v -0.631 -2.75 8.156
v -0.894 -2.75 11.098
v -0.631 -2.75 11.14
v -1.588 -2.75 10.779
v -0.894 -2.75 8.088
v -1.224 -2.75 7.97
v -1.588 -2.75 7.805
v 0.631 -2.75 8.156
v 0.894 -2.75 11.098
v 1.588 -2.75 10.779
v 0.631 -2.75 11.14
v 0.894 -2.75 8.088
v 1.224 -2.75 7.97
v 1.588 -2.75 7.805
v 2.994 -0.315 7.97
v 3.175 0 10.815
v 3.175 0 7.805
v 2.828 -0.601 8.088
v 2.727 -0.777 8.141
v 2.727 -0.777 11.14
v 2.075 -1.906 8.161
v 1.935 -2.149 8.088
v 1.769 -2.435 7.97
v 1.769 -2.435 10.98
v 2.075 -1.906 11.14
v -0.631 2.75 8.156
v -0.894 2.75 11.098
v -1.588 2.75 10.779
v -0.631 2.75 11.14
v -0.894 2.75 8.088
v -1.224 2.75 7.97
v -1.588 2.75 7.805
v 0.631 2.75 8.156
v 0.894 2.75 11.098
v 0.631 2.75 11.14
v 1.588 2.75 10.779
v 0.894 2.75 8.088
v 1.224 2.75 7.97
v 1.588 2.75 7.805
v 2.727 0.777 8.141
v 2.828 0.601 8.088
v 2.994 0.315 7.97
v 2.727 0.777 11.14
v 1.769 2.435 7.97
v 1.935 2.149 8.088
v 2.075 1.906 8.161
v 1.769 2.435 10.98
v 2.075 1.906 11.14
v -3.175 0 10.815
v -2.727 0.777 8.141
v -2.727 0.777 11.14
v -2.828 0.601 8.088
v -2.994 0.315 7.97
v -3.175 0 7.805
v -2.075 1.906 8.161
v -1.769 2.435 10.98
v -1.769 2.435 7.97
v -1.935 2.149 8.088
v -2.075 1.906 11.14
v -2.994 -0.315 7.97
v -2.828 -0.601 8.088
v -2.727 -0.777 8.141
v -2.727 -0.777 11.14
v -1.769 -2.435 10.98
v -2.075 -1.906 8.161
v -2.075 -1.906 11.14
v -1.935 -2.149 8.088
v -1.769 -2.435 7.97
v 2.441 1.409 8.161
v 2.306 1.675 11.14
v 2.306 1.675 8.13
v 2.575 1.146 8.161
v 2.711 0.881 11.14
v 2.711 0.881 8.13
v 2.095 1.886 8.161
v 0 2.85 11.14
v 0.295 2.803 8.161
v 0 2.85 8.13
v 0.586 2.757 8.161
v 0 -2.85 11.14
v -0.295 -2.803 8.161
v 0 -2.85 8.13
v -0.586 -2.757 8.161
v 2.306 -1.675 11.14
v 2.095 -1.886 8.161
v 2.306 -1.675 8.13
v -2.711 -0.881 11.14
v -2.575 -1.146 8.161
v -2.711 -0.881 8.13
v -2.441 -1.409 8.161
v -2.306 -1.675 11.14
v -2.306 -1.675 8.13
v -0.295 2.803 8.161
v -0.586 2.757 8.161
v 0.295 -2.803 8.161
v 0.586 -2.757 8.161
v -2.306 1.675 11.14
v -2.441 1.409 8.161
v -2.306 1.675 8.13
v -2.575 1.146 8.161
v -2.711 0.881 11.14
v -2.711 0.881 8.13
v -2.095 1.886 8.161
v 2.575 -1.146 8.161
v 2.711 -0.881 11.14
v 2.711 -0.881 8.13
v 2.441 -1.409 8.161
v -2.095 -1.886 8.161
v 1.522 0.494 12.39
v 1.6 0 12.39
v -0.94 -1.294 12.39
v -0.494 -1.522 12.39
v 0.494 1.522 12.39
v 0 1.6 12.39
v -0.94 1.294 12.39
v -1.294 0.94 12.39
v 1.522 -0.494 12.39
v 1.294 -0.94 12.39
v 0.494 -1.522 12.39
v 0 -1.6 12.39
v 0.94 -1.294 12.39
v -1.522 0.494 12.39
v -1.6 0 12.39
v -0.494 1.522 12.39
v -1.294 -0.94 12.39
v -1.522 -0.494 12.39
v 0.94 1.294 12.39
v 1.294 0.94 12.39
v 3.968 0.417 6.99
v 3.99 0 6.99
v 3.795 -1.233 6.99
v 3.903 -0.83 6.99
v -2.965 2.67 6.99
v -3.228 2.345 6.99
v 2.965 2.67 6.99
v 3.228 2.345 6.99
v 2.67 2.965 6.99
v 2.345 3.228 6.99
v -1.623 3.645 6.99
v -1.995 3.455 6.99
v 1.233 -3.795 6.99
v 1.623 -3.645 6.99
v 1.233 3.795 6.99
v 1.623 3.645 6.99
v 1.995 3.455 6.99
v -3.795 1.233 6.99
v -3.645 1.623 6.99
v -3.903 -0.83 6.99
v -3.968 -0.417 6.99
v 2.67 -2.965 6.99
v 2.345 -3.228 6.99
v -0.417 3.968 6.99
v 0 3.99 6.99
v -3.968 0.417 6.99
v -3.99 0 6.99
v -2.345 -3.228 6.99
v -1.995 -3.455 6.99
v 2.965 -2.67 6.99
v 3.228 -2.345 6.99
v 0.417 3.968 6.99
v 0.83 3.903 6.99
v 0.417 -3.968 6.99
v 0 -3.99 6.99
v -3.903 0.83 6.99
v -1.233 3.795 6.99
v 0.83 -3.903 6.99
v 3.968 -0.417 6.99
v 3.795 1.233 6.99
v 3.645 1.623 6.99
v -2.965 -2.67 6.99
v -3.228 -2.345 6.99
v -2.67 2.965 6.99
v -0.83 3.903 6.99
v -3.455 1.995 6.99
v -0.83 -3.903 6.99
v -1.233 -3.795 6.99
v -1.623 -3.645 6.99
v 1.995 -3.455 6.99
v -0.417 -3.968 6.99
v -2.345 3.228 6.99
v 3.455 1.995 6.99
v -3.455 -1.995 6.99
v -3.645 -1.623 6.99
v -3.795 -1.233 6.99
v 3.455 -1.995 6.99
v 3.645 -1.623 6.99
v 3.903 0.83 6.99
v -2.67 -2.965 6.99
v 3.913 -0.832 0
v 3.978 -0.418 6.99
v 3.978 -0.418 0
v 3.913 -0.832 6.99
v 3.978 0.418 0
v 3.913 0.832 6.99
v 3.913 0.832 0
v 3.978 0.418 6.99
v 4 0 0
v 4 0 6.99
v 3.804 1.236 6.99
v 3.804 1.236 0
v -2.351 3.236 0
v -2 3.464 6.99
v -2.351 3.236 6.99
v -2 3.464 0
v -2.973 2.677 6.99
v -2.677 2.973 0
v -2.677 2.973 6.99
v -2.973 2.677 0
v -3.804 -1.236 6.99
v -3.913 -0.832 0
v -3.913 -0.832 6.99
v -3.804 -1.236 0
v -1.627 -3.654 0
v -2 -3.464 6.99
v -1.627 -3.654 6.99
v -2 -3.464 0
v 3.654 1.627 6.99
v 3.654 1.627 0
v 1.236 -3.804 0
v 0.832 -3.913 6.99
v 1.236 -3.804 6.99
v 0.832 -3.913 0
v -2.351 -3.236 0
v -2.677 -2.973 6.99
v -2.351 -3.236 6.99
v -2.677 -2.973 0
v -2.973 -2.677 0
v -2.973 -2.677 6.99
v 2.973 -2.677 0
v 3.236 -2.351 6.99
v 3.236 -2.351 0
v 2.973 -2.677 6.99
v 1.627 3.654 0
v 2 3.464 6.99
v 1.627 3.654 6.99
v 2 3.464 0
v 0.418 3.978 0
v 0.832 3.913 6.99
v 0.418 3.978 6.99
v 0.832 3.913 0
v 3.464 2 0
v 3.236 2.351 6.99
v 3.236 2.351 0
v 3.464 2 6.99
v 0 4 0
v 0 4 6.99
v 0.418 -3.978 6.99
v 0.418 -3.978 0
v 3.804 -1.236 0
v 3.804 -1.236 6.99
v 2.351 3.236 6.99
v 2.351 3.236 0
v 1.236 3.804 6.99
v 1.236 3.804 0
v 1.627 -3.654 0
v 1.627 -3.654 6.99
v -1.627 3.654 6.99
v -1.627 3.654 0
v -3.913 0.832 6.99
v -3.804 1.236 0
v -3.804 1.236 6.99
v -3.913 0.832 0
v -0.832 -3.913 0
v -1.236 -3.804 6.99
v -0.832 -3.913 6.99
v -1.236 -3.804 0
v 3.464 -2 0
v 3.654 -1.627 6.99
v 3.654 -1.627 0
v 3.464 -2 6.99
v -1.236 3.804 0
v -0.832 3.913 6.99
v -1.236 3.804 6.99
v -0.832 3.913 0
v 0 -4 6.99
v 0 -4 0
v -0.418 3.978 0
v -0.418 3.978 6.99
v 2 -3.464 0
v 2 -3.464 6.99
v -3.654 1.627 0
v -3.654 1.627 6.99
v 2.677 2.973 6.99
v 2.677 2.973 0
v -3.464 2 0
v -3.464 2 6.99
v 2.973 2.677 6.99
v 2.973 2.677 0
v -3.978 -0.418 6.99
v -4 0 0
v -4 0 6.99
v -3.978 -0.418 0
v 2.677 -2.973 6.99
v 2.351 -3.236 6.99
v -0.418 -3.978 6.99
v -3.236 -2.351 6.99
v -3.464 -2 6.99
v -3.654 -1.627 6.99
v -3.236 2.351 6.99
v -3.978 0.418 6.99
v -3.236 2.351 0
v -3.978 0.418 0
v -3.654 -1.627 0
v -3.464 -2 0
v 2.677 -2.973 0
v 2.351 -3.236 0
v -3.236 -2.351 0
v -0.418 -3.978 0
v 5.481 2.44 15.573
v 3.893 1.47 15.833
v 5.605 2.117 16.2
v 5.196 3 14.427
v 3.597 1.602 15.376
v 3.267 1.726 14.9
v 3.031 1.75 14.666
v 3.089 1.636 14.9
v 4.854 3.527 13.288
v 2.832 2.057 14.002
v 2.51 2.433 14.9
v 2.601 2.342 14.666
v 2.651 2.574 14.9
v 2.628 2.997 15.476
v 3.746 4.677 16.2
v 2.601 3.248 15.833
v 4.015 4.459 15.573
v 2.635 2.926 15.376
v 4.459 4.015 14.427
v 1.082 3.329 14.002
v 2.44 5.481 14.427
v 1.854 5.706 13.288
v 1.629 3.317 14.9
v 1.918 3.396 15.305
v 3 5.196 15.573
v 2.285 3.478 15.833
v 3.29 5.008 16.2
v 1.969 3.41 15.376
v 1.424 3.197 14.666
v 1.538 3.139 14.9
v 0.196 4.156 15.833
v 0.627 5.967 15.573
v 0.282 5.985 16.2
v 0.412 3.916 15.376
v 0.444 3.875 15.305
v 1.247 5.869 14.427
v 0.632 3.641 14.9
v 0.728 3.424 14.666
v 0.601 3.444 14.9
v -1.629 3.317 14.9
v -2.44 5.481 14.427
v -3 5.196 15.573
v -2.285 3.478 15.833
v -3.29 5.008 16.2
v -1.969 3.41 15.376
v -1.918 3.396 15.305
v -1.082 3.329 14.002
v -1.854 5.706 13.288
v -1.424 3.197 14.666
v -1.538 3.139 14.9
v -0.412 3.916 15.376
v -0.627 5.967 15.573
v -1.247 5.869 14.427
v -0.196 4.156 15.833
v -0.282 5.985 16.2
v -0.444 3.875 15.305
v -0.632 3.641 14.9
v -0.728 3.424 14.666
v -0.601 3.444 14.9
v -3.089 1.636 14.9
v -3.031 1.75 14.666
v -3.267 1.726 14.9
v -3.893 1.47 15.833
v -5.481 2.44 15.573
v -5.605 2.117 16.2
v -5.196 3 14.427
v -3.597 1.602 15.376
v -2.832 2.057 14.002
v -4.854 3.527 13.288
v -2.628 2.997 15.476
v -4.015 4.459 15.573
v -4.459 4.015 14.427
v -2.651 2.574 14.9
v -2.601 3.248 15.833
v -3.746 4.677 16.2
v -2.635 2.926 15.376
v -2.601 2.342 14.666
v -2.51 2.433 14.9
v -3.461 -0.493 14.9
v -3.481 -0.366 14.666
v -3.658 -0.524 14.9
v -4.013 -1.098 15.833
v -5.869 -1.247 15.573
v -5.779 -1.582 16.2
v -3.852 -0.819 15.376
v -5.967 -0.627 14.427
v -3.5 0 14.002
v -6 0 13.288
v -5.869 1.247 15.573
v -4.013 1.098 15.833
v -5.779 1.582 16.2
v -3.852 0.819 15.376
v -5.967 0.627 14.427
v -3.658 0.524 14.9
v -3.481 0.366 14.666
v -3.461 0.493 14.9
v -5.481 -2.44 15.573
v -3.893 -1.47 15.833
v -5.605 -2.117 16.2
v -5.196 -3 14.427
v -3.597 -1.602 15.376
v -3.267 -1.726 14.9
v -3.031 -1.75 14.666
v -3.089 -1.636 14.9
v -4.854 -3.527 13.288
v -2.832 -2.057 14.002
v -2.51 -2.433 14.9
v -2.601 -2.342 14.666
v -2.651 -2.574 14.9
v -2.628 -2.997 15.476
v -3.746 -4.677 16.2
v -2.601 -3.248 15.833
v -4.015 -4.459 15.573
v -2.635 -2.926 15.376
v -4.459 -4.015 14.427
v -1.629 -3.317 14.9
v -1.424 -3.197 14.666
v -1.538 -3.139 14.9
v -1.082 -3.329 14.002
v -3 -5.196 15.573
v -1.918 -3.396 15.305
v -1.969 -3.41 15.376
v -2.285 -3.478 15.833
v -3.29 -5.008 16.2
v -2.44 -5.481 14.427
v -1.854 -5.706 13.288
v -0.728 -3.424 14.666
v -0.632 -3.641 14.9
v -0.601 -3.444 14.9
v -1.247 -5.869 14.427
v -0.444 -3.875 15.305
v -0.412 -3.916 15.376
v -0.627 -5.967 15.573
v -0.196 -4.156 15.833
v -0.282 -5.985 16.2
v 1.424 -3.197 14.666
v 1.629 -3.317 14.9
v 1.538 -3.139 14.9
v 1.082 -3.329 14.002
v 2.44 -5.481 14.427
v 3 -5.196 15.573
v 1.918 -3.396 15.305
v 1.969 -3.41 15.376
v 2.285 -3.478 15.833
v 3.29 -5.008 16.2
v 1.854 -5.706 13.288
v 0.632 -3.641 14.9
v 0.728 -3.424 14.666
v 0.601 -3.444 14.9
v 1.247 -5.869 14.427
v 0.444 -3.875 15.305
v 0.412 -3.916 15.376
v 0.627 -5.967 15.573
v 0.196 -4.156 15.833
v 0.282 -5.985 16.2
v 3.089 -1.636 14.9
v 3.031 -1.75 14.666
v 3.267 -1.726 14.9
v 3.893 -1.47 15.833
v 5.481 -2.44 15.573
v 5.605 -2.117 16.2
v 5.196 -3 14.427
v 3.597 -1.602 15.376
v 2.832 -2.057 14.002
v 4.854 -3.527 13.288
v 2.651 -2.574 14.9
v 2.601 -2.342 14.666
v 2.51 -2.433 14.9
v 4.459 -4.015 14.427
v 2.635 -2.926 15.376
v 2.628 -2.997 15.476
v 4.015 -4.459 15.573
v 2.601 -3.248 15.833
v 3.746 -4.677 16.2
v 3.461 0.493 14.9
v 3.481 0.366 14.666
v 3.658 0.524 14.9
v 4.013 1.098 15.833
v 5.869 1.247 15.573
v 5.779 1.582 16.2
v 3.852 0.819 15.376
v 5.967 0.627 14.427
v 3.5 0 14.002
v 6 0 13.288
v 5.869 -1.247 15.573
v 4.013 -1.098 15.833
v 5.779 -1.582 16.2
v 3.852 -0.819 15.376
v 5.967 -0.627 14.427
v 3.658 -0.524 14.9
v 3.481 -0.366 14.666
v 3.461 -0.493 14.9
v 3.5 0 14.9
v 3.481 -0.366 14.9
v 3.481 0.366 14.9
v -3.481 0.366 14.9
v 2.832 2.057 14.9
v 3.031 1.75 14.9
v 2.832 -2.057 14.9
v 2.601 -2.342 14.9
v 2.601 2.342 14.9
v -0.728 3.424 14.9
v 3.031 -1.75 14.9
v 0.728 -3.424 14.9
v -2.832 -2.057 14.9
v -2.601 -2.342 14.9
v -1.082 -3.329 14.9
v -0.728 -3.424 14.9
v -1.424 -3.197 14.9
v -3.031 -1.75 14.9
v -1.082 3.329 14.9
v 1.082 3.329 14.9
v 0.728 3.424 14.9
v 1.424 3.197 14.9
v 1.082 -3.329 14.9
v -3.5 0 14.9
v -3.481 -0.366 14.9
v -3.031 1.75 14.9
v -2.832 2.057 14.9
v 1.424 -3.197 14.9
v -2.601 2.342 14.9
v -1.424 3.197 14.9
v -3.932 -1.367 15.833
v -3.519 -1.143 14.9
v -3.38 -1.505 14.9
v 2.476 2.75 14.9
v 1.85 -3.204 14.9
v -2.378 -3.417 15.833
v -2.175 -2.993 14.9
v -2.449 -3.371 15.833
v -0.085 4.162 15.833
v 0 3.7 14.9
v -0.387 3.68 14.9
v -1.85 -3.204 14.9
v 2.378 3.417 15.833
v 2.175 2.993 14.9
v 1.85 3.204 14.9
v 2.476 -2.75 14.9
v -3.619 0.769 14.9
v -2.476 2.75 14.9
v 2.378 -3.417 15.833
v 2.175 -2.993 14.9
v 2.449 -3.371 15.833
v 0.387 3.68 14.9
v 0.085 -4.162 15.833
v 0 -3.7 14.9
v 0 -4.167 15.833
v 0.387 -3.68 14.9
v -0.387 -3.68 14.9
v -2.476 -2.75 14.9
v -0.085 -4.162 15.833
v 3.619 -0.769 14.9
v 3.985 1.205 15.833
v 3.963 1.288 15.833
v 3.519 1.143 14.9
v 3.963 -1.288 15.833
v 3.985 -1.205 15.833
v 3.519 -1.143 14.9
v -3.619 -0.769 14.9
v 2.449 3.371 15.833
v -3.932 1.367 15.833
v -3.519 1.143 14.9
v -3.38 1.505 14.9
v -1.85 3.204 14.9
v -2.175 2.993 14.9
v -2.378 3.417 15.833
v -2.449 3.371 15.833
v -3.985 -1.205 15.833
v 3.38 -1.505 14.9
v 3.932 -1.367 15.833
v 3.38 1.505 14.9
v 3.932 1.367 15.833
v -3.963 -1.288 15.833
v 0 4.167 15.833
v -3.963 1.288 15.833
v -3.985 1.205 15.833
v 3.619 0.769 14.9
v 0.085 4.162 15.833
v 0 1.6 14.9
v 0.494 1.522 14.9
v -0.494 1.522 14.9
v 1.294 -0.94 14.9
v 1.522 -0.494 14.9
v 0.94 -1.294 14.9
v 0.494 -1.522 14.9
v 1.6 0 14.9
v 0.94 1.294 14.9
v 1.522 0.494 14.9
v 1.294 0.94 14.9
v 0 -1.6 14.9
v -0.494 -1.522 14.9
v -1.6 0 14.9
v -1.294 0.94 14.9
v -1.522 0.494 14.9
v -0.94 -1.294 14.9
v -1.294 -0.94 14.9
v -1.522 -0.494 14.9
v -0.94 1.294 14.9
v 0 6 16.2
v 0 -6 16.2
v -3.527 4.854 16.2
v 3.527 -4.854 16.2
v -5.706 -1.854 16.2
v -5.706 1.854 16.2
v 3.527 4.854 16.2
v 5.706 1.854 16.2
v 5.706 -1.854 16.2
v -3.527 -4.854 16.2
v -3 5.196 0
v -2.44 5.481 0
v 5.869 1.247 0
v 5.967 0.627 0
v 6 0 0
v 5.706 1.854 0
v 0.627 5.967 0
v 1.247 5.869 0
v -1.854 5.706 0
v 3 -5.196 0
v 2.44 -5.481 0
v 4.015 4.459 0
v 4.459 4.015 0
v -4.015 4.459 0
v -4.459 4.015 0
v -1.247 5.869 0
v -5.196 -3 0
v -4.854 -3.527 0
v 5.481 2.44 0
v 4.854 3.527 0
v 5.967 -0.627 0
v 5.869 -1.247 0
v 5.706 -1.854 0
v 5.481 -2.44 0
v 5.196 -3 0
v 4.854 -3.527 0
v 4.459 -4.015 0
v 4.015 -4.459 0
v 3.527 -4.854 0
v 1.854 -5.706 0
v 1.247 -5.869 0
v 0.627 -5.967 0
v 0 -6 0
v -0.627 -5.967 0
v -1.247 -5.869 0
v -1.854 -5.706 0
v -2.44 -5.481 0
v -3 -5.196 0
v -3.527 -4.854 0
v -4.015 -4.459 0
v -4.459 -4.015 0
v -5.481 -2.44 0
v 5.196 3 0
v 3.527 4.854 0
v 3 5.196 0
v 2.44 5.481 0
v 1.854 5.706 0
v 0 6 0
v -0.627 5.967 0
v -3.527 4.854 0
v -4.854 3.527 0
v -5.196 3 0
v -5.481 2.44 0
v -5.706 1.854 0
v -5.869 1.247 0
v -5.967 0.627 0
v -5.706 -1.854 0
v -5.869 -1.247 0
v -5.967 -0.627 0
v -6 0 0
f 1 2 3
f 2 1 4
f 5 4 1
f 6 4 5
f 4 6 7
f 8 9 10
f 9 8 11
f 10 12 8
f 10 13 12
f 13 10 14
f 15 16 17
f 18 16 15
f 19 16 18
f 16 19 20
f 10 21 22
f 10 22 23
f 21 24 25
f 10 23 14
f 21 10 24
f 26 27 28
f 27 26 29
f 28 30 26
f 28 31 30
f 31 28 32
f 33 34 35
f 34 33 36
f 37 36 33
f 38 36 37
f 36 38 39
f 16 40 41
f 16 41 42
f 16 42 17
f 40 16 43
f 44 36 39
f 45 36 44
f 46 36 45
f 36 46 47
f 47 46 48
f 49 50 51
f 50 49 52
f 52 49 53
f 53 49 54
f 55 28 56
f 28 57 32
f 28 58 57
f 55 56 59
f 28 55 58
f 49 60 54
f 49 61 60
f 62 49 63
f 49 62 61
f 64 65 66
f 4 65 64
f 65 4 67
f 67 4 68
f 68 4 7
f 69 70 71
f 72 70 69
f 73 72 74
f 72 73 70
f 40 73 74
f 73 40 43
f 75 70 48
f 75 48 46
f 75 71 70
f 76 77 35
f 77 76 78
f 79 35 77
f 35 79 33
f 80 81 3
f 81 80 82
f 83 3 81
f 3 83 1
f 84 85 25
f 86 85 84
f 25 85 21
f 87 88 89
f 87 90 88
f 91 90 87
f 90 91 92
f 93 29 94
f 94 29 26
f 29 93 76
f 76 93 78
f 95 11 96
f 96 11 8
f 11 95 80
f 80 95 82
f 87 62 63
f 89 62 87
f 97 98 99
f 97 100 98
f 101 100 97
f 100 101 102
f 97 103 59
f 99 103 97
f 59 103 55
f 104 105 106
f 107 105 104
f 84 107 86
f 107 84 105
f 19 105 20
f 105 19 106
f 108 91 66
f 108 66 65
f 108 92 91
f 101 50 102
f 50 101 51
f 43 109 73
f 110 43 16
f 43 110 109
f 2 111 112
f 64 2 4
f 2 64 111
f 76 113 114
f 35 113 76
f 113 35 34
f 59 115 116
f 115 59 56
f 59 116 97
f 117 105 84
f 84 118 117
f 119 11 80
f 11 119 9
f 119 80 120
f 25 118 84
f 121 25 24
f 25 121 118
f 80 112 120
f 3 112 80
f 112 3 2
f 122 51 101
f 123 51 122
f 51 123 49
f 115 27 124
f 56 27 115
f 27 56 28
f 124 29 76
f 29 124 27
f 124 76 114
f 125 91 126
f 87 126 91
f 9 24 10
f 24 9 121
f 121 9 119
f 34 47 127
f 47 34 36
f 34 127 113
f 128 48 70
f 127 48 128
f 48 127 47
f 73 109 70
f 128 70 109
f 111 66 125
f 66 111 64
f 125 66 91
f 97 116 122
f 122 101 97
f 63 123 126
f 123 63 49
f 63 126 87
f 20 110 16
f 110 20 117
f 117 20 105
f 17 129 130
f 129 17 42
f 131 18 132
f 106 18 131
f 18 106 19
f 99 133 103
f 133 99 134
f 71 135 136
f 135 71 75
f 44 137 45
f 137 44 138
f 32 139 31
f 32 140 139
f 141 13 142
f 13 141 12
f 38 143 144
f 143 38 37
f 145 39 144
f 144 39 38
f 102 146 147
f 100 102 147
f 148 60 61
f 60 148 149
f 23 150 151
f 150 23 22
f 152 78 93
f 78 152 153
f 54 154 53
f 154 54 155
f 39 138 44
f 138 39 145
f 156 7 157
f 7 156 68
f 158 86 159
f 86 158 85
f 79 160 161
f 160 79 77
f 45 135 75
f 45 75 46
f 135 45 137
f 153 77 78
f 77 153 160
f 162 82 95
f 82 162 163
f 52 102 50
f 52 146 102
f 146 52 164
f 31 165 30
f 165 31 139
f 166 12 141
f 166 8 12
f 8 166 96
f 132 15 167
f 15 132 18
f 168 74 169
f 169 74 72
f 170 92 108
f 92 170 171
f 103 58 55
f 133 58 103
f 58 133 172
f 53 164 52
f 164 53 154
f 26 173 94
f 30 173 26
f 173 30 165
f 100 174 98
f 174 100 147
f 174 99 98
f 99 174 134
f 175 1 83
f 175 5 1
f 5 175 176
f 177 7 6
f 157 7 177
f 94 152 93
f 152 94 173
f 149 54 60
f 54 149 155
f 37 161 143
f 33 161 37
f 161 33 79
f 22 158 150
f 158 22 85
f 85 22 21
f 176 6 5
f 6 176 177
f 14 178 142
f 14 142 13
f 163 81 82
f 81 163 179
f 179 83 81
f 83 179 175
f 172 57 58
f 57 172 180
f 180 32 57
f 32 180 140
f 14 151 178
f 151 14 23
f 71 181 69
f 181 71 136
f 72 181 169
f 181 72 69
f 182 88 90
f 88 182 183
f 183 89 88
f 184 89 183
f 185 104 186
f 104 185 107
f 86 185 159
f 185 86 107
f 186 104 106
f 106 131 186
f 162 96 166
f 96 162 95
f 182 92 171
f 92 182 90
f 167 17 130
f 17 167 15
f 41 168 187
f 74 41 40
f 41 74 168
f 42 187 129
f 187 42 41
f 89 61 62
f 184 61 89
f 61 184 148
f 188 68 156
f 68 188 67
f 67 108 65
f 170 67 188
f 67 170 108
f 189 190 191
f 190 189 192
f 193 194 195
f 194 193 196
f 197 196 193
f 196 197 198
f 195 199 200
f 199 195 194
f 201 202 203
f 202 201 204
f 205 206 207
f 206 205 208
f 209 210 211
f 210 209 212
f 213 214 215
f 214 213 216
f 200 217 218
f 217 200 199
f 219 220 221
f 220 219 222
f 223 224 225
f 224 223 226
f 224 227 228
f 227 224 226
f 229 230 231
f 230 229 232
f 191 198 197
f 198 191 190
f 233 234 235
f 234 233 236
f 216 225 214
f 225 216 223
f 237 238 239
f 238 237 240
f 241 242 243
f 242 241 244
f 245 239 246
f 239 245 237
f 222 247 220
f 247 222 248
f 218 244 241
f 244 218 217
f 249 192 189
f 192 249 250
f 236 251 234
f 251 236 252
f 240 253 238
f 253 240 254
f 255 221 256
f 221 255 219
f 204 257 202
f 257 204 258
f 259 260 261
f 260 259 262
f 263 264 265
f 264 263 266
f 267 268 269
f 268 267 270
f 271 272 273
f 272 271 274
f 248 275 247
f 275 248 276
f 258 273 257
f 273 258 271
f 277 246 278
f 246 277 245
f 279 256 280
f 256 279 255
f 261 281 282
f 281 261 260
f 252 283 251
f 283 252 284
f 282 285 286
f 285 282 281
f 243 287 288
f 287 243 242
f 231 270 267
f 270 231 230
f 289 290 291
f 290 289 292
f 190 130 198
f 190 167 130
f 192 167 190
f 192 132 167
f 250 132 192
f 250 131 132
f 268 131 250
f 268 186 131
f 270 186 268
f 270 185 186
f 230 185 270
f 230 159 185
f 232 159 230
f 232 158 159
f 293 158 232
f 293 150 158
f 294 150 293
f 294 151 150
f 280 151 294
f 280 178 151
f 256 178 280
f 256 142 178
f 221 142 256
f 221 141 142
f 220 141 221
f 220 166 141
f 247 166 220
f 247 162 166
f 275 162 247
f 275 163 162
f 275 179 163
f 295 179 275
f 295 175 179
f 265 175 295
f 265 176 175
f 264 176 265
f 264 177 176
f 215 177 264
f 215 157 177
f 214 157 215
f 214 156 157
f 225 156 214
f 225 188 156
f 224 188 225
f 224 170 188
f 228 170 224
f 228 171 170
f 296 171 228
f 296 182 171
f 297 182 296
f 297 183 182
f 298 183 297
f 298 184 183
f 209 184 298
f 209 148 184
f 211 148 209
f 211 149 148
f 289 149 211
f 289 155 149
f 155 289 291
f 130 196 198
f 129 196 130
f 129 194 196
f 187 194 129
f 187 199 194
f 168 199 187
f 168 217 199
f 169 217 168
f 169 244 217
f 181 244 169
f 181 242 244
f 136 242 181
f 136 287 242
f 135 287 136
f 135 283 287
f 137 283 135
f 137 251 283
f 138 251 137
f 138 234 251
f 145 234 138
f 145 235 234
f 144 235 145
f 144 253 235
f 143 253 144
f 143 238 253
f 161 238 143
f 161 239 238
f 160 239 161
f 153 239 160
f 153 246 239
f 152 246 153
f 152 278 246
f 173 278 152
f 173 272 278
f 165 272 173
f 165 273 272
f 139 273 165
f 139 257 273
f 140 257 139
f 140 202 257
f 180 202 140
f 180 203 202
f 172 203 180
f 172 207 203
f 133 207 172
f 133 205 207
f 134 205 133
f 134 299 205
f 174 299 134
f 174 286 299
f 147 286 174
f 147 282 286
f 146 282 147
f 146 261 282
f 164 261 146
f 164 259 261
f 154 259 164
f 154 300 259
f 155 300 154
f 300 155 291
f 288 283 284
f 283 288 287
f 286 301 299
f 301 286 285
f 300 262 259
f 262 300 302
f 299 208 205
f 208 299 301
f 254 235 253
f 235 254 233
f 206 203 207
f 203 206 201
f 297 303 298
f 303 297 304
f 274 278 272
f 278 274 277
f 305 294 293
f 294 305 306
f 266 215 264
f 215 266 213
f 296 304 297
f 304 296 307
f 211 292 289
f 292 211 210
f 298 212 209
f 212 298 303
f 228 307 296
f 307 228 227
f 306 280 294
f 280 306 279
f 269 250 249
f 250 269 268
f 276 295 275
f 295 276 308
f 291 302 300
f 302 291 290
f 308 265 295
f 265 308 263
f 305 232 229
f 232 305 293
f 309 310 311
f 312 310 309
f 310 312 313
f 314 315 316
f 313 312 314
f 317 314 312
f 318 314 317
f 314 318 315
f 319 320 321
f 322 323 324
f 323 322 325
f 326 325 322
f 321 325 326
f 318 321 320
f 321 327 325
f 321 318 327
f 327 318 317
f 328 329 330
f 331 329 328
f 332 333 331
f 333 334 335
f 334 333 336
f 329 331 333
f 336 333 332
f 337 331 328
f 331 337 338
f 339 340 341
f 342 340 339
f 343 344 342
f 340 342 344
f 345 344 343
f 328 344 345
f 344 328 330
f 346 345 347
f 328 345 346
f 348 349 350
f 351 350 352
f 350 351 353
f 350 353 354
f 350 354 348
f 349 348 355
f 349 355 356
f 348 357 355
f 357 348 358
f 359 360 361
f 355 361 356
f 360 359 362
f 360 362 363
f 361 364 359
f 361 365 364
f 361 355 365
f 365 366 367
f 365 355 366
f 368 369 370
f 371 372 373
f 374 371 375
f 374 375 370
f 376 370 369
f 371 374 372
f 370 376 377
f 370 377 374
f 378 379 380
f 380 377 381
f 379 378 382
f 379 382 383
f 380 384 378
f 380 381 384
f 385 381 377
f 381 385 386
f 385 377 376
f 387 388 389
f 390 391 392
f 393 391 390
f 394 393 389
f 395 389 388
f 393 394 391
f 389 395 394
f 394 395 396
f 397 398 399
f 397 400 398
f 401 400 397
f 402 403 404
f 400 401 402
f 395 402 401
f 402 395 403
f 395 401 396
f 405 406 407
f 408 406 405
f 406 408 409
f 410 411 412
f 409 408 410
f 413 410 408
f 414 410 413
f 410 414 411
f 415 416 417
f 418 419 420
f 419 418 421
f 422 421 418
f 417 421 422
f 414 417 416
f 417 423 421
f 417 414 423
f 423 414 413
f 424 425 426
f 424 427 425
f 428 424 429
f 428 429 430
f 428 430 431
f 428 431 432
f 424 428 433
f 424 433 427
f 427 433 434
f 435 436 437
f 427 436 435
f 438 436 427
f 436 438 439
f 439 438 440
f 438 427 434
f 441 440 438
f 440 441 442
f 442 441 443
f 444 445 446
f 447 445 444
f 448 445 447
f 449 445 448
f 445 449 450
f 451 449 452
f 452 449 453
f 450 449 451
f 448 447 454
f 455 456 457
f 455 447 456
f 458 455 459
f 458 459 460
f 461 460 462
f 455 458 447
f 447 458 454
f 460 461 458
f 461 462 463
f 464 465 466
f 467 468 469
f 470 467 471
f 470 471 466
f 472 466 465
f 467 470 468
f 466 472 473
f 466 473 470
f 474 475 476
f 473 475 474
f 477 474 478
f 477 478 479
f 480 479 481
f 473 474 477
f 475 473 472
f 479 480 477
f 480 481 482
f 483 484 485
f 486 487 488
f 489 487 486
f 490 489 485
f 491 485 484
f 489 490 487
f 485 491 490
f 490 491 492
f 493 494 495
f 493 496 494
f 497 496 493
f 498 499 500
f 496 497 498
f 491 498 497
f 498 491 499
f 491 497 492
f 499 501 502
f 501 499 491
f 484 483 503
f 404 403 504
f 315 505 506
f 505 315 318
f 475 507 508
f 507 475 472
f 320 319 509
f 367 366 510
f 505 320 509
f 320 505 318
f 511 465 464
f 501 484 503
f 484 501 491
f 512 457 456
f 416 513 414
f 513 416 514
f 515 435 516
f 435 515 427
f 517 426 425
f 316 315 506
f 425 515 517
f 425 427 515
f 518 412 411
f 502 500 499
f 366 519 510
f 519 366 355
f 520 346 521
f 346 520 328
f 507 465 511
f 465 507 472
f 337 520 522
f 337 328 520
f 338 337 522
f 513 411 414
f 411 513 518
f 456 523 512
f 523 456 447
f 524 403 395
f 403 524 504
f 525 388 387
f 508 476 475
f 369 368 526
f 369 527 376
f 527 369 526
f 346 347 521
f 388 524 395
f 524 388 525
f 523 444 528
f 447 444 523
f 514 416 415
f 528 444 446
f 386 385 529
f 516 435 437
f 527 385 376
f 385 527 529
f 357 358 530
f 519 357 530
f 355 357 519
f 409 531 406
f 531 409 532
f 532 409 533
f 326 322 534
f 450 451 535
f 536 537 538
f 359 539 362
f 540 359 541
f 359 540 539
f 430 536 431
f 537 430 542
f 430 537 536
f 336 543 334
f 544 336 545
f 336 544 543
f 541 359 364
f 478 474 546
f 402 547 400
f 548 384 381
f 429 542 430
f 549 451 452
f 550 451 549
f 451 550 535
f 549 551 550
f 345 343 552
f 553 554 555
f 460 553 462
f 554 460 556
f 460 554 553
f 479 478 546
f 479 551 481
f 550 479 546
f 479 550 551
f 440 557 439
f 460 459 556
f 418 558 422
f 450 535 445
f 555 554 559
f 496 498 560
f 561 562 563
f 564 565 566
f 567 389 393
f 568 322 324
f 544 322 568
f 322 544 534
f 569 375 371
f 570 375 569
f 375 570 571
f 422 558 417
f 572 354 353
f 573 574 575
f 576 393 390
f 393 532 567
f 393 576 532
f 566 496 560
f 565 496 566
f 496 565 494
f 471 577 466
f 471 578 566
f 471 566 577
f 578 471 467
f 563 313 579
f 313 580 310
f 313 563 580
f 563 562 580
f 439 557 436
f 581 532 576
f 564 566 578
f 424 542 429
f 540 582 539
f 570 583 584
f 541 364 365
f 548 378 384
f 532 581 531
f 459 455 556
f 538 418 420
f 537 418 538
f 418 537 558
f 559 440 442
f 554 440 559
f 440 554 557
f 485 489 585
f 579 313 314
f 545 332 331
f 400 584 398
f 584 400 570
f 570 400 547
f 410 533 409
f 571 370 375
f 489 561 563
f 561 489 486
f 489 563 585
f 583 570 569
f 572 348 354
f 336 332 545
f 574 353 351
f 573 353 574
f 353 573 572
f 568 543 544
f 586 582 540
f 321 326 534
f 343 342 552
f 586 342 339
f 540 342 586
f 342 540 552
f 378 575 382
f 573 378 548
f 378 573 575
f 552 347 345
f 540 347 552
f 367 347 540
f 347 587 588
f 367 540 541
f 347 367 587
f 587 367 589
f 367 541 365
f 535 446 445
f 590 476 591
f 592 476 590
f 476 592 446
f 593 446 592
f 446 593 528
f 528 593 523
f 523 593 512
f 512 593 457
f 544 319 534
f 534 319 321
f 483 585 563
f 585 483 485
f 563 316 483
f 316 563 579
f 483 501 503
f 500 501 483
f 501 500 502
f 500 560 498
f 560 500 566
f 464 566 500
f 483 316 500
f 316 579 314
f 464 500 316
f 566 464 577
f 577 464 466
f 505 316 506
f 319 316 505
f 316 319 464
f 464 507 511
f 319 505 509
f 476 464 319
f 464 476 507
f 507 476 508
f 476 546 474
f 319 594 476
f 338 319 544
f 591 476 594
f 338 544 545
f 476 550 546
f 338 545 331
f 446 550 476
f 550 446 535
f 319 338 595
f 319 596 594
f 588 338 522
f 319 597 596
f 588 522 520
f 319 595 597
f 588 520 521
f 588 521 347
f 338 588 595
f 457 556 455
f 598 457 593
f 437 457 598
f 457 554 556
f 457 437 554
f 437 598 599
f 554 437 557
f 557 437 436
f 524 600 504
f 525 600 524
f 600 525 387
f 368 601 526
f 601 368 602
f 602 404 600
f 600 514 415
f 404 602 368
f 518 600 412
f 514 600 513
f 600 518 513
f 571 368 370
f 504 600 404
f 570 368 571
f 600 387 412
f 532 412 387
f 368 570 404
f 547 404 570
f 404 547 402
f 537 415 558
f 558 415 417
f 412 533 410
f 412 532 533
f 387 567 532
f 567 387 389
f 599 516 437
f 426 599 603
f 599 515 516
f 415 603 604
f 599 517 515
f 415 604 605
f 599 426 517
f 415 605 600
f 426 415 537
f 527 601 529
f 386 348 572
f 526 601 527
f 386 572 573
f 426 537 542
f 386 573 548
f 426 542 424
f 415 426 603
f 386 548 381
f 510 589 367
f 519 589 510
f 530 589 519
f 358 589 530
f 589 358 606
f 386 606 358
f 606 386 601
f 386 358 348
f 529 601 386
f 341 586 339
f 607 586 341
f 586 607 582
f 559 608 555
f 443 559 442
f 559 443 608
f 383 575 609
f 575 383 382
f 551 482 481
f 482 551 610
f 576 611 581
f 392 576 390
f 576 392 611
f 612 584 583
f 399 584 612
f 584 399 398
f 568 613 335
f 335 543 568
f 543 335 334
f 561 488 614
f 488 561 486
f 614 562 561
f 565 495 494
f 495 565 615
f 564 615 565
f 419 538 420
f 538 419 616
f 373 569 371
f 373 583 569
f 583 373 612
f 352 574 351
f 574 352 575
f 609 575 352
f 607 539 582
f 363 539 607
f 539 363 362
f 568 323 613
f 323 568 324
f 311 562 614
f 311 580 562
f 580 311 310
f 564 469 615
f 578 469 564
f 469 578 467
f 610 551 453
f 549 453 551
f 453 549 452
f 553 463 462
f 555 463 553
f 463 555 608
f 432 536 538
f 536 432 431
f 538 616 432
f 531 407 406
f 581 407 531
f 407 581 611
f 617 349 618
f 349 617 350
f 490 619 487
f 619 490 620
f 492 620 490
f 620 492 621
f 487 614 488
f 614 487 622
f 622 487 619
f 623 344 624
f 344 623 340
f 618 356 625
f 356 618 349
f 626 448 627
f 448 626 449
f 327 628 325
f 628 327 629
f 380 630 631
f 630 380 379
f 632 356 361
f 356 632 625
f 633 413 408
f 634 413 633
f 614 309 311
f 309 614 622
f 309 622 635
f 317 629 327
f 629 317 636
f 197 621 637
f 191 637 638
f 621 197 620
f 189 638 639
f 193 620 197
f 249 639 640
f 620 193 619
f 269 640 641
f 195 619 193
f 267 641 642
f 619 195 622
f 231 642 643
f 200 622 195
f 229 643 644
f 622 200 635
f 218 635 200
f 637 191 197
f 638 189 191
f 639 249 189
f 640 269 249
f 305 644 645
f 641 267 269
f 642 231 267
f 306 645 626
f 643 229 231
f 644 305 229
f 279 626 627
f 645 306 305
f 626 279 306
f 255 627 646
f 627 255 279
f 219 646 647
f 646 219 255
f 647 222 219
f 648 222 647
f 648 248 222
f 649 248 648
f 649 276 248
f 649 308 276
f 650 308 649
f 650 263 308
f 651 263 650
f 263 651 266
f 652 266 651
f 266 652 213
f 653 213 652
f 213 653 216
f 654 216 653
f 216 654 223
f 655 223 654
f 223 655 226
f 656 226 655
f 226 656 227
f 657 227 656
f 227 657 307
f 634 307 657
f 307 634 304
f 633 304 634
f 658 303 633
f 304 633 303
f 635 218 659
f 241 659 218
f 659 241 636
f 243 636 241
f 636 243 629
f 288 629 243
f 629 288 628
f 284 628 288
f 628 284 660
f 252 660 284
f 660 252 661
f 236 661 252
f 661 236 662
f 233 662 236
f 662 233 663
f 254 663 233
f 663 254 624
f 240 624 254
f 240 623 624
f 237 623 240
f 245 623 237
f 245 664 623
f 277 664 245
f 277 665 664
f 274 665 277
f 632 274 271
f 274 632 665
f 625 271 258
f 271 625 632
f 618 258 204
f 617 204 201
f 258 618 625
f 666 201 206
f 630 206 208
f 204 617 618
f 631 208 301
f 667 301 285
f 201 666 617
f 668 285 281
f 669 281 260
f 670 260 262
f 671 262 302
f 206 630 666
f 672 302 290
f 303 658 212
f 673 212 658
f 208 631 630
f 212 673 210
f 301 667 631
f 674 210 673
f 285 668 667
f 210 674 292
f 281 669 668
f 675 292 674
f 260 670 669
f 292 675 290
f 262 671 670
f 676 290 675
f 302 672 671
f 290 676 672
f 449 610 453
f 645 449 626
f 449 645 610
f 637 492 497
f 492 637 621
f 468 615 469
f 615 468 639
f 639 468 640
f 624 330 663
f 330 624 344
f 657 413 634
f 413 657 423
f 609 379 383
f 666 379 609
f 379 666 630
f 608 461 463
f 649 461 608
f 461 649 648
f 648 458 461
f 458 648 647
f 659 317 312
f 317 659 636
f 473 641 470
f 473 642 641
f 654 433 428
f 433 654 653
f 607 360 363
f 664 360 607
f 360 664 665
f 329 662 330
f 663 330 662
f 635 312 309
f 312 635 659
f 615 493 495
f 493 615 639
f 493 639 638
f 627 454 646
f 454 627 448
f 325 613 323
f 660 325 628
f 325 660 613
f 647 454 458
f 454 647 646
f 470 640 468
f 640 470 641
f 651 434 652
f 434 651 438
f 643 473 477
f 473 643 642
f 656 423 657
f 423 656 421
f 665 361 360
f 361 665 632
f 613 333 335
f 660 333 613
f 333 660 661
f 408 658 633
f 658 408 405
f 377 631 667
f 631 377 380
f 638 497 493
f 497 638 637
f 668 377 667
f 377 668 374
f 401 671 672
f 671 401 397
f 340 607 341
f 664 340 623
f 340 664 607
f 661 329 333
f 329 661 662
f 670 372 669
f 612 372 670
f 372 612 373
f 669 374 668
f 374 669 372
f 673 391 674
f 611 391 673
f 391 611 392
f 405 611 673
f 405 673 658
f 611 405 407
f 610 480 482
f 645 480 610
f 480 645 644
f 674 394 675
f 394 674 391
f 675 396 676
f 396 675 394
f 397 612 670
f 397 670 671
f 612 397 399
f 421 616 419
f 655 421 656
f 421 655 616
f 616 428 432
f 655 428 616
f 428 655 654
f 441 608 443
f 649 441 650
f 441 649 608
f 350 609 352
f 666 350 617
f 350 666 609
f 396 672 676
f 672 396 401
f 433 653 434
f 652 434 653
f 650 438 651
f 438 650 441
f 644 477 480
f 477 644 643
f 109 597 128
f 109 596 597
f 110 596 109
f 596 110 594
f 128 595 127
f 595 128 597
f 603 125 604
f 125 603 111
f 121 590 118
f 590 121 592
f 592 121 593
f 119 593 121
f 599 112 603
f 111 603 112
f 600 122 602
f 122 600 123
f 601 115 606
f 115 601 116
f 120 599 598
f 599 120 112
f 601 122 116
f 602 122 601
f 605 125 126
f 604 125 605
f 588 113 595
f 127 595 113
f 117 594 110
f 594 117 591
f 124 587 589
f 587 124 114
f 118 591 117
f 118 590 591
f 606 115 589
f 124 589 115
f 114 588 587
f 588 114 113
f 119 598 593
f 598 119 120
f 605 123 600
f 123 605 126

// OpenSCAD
module hirth_tool(n,r){
rotate(a=asin(sqrt(3)*tan(90/n)),v=[0,1,0])translate([-0.1*r,0,0])rotate(a=90,v=[0,1,0])translate([-r*1,0,0])linear_extrude(height=r*1.2)circle(r=r,$fn=3);
}

module hirth(n,r) {
for (i=[1:n])rotate(360/n*i)hirth_tool(n,r);
}

difference(){
cylinder(r=6,h=20,$fn=60); 
translate([0,0,-0.01]){
translate([0,0,6.99])cylinder(r1=4,r2=0,h=4,$fn=60);
cylinder(r=4,h=7,$fn=60);
intersection(){
union(){cylinder(r=5.5/sqrt(3),h=14,$fn=6);cylinder(r=5.7/2,h=14,$fn=20);}
cylinder(r1=14,r2=0,h=14,$fn=20);
}

}

cylinder(r=3.2/2,h=20,$fn=20);

translate([0,0,15]) { 
difference(){hirth(10,10);translate([0,0,-5])cylinder(r=3.5,h=10,$fn=60);}
translate([0,0,-0.1])cylinder(r1=3.7,r2=3.7+5,h=10,$fn=60);
cylinder(r1=0,r2=10,h=2.,$fn=60);}
}
%translate([0,0,15])hirth_tool(10,10);
